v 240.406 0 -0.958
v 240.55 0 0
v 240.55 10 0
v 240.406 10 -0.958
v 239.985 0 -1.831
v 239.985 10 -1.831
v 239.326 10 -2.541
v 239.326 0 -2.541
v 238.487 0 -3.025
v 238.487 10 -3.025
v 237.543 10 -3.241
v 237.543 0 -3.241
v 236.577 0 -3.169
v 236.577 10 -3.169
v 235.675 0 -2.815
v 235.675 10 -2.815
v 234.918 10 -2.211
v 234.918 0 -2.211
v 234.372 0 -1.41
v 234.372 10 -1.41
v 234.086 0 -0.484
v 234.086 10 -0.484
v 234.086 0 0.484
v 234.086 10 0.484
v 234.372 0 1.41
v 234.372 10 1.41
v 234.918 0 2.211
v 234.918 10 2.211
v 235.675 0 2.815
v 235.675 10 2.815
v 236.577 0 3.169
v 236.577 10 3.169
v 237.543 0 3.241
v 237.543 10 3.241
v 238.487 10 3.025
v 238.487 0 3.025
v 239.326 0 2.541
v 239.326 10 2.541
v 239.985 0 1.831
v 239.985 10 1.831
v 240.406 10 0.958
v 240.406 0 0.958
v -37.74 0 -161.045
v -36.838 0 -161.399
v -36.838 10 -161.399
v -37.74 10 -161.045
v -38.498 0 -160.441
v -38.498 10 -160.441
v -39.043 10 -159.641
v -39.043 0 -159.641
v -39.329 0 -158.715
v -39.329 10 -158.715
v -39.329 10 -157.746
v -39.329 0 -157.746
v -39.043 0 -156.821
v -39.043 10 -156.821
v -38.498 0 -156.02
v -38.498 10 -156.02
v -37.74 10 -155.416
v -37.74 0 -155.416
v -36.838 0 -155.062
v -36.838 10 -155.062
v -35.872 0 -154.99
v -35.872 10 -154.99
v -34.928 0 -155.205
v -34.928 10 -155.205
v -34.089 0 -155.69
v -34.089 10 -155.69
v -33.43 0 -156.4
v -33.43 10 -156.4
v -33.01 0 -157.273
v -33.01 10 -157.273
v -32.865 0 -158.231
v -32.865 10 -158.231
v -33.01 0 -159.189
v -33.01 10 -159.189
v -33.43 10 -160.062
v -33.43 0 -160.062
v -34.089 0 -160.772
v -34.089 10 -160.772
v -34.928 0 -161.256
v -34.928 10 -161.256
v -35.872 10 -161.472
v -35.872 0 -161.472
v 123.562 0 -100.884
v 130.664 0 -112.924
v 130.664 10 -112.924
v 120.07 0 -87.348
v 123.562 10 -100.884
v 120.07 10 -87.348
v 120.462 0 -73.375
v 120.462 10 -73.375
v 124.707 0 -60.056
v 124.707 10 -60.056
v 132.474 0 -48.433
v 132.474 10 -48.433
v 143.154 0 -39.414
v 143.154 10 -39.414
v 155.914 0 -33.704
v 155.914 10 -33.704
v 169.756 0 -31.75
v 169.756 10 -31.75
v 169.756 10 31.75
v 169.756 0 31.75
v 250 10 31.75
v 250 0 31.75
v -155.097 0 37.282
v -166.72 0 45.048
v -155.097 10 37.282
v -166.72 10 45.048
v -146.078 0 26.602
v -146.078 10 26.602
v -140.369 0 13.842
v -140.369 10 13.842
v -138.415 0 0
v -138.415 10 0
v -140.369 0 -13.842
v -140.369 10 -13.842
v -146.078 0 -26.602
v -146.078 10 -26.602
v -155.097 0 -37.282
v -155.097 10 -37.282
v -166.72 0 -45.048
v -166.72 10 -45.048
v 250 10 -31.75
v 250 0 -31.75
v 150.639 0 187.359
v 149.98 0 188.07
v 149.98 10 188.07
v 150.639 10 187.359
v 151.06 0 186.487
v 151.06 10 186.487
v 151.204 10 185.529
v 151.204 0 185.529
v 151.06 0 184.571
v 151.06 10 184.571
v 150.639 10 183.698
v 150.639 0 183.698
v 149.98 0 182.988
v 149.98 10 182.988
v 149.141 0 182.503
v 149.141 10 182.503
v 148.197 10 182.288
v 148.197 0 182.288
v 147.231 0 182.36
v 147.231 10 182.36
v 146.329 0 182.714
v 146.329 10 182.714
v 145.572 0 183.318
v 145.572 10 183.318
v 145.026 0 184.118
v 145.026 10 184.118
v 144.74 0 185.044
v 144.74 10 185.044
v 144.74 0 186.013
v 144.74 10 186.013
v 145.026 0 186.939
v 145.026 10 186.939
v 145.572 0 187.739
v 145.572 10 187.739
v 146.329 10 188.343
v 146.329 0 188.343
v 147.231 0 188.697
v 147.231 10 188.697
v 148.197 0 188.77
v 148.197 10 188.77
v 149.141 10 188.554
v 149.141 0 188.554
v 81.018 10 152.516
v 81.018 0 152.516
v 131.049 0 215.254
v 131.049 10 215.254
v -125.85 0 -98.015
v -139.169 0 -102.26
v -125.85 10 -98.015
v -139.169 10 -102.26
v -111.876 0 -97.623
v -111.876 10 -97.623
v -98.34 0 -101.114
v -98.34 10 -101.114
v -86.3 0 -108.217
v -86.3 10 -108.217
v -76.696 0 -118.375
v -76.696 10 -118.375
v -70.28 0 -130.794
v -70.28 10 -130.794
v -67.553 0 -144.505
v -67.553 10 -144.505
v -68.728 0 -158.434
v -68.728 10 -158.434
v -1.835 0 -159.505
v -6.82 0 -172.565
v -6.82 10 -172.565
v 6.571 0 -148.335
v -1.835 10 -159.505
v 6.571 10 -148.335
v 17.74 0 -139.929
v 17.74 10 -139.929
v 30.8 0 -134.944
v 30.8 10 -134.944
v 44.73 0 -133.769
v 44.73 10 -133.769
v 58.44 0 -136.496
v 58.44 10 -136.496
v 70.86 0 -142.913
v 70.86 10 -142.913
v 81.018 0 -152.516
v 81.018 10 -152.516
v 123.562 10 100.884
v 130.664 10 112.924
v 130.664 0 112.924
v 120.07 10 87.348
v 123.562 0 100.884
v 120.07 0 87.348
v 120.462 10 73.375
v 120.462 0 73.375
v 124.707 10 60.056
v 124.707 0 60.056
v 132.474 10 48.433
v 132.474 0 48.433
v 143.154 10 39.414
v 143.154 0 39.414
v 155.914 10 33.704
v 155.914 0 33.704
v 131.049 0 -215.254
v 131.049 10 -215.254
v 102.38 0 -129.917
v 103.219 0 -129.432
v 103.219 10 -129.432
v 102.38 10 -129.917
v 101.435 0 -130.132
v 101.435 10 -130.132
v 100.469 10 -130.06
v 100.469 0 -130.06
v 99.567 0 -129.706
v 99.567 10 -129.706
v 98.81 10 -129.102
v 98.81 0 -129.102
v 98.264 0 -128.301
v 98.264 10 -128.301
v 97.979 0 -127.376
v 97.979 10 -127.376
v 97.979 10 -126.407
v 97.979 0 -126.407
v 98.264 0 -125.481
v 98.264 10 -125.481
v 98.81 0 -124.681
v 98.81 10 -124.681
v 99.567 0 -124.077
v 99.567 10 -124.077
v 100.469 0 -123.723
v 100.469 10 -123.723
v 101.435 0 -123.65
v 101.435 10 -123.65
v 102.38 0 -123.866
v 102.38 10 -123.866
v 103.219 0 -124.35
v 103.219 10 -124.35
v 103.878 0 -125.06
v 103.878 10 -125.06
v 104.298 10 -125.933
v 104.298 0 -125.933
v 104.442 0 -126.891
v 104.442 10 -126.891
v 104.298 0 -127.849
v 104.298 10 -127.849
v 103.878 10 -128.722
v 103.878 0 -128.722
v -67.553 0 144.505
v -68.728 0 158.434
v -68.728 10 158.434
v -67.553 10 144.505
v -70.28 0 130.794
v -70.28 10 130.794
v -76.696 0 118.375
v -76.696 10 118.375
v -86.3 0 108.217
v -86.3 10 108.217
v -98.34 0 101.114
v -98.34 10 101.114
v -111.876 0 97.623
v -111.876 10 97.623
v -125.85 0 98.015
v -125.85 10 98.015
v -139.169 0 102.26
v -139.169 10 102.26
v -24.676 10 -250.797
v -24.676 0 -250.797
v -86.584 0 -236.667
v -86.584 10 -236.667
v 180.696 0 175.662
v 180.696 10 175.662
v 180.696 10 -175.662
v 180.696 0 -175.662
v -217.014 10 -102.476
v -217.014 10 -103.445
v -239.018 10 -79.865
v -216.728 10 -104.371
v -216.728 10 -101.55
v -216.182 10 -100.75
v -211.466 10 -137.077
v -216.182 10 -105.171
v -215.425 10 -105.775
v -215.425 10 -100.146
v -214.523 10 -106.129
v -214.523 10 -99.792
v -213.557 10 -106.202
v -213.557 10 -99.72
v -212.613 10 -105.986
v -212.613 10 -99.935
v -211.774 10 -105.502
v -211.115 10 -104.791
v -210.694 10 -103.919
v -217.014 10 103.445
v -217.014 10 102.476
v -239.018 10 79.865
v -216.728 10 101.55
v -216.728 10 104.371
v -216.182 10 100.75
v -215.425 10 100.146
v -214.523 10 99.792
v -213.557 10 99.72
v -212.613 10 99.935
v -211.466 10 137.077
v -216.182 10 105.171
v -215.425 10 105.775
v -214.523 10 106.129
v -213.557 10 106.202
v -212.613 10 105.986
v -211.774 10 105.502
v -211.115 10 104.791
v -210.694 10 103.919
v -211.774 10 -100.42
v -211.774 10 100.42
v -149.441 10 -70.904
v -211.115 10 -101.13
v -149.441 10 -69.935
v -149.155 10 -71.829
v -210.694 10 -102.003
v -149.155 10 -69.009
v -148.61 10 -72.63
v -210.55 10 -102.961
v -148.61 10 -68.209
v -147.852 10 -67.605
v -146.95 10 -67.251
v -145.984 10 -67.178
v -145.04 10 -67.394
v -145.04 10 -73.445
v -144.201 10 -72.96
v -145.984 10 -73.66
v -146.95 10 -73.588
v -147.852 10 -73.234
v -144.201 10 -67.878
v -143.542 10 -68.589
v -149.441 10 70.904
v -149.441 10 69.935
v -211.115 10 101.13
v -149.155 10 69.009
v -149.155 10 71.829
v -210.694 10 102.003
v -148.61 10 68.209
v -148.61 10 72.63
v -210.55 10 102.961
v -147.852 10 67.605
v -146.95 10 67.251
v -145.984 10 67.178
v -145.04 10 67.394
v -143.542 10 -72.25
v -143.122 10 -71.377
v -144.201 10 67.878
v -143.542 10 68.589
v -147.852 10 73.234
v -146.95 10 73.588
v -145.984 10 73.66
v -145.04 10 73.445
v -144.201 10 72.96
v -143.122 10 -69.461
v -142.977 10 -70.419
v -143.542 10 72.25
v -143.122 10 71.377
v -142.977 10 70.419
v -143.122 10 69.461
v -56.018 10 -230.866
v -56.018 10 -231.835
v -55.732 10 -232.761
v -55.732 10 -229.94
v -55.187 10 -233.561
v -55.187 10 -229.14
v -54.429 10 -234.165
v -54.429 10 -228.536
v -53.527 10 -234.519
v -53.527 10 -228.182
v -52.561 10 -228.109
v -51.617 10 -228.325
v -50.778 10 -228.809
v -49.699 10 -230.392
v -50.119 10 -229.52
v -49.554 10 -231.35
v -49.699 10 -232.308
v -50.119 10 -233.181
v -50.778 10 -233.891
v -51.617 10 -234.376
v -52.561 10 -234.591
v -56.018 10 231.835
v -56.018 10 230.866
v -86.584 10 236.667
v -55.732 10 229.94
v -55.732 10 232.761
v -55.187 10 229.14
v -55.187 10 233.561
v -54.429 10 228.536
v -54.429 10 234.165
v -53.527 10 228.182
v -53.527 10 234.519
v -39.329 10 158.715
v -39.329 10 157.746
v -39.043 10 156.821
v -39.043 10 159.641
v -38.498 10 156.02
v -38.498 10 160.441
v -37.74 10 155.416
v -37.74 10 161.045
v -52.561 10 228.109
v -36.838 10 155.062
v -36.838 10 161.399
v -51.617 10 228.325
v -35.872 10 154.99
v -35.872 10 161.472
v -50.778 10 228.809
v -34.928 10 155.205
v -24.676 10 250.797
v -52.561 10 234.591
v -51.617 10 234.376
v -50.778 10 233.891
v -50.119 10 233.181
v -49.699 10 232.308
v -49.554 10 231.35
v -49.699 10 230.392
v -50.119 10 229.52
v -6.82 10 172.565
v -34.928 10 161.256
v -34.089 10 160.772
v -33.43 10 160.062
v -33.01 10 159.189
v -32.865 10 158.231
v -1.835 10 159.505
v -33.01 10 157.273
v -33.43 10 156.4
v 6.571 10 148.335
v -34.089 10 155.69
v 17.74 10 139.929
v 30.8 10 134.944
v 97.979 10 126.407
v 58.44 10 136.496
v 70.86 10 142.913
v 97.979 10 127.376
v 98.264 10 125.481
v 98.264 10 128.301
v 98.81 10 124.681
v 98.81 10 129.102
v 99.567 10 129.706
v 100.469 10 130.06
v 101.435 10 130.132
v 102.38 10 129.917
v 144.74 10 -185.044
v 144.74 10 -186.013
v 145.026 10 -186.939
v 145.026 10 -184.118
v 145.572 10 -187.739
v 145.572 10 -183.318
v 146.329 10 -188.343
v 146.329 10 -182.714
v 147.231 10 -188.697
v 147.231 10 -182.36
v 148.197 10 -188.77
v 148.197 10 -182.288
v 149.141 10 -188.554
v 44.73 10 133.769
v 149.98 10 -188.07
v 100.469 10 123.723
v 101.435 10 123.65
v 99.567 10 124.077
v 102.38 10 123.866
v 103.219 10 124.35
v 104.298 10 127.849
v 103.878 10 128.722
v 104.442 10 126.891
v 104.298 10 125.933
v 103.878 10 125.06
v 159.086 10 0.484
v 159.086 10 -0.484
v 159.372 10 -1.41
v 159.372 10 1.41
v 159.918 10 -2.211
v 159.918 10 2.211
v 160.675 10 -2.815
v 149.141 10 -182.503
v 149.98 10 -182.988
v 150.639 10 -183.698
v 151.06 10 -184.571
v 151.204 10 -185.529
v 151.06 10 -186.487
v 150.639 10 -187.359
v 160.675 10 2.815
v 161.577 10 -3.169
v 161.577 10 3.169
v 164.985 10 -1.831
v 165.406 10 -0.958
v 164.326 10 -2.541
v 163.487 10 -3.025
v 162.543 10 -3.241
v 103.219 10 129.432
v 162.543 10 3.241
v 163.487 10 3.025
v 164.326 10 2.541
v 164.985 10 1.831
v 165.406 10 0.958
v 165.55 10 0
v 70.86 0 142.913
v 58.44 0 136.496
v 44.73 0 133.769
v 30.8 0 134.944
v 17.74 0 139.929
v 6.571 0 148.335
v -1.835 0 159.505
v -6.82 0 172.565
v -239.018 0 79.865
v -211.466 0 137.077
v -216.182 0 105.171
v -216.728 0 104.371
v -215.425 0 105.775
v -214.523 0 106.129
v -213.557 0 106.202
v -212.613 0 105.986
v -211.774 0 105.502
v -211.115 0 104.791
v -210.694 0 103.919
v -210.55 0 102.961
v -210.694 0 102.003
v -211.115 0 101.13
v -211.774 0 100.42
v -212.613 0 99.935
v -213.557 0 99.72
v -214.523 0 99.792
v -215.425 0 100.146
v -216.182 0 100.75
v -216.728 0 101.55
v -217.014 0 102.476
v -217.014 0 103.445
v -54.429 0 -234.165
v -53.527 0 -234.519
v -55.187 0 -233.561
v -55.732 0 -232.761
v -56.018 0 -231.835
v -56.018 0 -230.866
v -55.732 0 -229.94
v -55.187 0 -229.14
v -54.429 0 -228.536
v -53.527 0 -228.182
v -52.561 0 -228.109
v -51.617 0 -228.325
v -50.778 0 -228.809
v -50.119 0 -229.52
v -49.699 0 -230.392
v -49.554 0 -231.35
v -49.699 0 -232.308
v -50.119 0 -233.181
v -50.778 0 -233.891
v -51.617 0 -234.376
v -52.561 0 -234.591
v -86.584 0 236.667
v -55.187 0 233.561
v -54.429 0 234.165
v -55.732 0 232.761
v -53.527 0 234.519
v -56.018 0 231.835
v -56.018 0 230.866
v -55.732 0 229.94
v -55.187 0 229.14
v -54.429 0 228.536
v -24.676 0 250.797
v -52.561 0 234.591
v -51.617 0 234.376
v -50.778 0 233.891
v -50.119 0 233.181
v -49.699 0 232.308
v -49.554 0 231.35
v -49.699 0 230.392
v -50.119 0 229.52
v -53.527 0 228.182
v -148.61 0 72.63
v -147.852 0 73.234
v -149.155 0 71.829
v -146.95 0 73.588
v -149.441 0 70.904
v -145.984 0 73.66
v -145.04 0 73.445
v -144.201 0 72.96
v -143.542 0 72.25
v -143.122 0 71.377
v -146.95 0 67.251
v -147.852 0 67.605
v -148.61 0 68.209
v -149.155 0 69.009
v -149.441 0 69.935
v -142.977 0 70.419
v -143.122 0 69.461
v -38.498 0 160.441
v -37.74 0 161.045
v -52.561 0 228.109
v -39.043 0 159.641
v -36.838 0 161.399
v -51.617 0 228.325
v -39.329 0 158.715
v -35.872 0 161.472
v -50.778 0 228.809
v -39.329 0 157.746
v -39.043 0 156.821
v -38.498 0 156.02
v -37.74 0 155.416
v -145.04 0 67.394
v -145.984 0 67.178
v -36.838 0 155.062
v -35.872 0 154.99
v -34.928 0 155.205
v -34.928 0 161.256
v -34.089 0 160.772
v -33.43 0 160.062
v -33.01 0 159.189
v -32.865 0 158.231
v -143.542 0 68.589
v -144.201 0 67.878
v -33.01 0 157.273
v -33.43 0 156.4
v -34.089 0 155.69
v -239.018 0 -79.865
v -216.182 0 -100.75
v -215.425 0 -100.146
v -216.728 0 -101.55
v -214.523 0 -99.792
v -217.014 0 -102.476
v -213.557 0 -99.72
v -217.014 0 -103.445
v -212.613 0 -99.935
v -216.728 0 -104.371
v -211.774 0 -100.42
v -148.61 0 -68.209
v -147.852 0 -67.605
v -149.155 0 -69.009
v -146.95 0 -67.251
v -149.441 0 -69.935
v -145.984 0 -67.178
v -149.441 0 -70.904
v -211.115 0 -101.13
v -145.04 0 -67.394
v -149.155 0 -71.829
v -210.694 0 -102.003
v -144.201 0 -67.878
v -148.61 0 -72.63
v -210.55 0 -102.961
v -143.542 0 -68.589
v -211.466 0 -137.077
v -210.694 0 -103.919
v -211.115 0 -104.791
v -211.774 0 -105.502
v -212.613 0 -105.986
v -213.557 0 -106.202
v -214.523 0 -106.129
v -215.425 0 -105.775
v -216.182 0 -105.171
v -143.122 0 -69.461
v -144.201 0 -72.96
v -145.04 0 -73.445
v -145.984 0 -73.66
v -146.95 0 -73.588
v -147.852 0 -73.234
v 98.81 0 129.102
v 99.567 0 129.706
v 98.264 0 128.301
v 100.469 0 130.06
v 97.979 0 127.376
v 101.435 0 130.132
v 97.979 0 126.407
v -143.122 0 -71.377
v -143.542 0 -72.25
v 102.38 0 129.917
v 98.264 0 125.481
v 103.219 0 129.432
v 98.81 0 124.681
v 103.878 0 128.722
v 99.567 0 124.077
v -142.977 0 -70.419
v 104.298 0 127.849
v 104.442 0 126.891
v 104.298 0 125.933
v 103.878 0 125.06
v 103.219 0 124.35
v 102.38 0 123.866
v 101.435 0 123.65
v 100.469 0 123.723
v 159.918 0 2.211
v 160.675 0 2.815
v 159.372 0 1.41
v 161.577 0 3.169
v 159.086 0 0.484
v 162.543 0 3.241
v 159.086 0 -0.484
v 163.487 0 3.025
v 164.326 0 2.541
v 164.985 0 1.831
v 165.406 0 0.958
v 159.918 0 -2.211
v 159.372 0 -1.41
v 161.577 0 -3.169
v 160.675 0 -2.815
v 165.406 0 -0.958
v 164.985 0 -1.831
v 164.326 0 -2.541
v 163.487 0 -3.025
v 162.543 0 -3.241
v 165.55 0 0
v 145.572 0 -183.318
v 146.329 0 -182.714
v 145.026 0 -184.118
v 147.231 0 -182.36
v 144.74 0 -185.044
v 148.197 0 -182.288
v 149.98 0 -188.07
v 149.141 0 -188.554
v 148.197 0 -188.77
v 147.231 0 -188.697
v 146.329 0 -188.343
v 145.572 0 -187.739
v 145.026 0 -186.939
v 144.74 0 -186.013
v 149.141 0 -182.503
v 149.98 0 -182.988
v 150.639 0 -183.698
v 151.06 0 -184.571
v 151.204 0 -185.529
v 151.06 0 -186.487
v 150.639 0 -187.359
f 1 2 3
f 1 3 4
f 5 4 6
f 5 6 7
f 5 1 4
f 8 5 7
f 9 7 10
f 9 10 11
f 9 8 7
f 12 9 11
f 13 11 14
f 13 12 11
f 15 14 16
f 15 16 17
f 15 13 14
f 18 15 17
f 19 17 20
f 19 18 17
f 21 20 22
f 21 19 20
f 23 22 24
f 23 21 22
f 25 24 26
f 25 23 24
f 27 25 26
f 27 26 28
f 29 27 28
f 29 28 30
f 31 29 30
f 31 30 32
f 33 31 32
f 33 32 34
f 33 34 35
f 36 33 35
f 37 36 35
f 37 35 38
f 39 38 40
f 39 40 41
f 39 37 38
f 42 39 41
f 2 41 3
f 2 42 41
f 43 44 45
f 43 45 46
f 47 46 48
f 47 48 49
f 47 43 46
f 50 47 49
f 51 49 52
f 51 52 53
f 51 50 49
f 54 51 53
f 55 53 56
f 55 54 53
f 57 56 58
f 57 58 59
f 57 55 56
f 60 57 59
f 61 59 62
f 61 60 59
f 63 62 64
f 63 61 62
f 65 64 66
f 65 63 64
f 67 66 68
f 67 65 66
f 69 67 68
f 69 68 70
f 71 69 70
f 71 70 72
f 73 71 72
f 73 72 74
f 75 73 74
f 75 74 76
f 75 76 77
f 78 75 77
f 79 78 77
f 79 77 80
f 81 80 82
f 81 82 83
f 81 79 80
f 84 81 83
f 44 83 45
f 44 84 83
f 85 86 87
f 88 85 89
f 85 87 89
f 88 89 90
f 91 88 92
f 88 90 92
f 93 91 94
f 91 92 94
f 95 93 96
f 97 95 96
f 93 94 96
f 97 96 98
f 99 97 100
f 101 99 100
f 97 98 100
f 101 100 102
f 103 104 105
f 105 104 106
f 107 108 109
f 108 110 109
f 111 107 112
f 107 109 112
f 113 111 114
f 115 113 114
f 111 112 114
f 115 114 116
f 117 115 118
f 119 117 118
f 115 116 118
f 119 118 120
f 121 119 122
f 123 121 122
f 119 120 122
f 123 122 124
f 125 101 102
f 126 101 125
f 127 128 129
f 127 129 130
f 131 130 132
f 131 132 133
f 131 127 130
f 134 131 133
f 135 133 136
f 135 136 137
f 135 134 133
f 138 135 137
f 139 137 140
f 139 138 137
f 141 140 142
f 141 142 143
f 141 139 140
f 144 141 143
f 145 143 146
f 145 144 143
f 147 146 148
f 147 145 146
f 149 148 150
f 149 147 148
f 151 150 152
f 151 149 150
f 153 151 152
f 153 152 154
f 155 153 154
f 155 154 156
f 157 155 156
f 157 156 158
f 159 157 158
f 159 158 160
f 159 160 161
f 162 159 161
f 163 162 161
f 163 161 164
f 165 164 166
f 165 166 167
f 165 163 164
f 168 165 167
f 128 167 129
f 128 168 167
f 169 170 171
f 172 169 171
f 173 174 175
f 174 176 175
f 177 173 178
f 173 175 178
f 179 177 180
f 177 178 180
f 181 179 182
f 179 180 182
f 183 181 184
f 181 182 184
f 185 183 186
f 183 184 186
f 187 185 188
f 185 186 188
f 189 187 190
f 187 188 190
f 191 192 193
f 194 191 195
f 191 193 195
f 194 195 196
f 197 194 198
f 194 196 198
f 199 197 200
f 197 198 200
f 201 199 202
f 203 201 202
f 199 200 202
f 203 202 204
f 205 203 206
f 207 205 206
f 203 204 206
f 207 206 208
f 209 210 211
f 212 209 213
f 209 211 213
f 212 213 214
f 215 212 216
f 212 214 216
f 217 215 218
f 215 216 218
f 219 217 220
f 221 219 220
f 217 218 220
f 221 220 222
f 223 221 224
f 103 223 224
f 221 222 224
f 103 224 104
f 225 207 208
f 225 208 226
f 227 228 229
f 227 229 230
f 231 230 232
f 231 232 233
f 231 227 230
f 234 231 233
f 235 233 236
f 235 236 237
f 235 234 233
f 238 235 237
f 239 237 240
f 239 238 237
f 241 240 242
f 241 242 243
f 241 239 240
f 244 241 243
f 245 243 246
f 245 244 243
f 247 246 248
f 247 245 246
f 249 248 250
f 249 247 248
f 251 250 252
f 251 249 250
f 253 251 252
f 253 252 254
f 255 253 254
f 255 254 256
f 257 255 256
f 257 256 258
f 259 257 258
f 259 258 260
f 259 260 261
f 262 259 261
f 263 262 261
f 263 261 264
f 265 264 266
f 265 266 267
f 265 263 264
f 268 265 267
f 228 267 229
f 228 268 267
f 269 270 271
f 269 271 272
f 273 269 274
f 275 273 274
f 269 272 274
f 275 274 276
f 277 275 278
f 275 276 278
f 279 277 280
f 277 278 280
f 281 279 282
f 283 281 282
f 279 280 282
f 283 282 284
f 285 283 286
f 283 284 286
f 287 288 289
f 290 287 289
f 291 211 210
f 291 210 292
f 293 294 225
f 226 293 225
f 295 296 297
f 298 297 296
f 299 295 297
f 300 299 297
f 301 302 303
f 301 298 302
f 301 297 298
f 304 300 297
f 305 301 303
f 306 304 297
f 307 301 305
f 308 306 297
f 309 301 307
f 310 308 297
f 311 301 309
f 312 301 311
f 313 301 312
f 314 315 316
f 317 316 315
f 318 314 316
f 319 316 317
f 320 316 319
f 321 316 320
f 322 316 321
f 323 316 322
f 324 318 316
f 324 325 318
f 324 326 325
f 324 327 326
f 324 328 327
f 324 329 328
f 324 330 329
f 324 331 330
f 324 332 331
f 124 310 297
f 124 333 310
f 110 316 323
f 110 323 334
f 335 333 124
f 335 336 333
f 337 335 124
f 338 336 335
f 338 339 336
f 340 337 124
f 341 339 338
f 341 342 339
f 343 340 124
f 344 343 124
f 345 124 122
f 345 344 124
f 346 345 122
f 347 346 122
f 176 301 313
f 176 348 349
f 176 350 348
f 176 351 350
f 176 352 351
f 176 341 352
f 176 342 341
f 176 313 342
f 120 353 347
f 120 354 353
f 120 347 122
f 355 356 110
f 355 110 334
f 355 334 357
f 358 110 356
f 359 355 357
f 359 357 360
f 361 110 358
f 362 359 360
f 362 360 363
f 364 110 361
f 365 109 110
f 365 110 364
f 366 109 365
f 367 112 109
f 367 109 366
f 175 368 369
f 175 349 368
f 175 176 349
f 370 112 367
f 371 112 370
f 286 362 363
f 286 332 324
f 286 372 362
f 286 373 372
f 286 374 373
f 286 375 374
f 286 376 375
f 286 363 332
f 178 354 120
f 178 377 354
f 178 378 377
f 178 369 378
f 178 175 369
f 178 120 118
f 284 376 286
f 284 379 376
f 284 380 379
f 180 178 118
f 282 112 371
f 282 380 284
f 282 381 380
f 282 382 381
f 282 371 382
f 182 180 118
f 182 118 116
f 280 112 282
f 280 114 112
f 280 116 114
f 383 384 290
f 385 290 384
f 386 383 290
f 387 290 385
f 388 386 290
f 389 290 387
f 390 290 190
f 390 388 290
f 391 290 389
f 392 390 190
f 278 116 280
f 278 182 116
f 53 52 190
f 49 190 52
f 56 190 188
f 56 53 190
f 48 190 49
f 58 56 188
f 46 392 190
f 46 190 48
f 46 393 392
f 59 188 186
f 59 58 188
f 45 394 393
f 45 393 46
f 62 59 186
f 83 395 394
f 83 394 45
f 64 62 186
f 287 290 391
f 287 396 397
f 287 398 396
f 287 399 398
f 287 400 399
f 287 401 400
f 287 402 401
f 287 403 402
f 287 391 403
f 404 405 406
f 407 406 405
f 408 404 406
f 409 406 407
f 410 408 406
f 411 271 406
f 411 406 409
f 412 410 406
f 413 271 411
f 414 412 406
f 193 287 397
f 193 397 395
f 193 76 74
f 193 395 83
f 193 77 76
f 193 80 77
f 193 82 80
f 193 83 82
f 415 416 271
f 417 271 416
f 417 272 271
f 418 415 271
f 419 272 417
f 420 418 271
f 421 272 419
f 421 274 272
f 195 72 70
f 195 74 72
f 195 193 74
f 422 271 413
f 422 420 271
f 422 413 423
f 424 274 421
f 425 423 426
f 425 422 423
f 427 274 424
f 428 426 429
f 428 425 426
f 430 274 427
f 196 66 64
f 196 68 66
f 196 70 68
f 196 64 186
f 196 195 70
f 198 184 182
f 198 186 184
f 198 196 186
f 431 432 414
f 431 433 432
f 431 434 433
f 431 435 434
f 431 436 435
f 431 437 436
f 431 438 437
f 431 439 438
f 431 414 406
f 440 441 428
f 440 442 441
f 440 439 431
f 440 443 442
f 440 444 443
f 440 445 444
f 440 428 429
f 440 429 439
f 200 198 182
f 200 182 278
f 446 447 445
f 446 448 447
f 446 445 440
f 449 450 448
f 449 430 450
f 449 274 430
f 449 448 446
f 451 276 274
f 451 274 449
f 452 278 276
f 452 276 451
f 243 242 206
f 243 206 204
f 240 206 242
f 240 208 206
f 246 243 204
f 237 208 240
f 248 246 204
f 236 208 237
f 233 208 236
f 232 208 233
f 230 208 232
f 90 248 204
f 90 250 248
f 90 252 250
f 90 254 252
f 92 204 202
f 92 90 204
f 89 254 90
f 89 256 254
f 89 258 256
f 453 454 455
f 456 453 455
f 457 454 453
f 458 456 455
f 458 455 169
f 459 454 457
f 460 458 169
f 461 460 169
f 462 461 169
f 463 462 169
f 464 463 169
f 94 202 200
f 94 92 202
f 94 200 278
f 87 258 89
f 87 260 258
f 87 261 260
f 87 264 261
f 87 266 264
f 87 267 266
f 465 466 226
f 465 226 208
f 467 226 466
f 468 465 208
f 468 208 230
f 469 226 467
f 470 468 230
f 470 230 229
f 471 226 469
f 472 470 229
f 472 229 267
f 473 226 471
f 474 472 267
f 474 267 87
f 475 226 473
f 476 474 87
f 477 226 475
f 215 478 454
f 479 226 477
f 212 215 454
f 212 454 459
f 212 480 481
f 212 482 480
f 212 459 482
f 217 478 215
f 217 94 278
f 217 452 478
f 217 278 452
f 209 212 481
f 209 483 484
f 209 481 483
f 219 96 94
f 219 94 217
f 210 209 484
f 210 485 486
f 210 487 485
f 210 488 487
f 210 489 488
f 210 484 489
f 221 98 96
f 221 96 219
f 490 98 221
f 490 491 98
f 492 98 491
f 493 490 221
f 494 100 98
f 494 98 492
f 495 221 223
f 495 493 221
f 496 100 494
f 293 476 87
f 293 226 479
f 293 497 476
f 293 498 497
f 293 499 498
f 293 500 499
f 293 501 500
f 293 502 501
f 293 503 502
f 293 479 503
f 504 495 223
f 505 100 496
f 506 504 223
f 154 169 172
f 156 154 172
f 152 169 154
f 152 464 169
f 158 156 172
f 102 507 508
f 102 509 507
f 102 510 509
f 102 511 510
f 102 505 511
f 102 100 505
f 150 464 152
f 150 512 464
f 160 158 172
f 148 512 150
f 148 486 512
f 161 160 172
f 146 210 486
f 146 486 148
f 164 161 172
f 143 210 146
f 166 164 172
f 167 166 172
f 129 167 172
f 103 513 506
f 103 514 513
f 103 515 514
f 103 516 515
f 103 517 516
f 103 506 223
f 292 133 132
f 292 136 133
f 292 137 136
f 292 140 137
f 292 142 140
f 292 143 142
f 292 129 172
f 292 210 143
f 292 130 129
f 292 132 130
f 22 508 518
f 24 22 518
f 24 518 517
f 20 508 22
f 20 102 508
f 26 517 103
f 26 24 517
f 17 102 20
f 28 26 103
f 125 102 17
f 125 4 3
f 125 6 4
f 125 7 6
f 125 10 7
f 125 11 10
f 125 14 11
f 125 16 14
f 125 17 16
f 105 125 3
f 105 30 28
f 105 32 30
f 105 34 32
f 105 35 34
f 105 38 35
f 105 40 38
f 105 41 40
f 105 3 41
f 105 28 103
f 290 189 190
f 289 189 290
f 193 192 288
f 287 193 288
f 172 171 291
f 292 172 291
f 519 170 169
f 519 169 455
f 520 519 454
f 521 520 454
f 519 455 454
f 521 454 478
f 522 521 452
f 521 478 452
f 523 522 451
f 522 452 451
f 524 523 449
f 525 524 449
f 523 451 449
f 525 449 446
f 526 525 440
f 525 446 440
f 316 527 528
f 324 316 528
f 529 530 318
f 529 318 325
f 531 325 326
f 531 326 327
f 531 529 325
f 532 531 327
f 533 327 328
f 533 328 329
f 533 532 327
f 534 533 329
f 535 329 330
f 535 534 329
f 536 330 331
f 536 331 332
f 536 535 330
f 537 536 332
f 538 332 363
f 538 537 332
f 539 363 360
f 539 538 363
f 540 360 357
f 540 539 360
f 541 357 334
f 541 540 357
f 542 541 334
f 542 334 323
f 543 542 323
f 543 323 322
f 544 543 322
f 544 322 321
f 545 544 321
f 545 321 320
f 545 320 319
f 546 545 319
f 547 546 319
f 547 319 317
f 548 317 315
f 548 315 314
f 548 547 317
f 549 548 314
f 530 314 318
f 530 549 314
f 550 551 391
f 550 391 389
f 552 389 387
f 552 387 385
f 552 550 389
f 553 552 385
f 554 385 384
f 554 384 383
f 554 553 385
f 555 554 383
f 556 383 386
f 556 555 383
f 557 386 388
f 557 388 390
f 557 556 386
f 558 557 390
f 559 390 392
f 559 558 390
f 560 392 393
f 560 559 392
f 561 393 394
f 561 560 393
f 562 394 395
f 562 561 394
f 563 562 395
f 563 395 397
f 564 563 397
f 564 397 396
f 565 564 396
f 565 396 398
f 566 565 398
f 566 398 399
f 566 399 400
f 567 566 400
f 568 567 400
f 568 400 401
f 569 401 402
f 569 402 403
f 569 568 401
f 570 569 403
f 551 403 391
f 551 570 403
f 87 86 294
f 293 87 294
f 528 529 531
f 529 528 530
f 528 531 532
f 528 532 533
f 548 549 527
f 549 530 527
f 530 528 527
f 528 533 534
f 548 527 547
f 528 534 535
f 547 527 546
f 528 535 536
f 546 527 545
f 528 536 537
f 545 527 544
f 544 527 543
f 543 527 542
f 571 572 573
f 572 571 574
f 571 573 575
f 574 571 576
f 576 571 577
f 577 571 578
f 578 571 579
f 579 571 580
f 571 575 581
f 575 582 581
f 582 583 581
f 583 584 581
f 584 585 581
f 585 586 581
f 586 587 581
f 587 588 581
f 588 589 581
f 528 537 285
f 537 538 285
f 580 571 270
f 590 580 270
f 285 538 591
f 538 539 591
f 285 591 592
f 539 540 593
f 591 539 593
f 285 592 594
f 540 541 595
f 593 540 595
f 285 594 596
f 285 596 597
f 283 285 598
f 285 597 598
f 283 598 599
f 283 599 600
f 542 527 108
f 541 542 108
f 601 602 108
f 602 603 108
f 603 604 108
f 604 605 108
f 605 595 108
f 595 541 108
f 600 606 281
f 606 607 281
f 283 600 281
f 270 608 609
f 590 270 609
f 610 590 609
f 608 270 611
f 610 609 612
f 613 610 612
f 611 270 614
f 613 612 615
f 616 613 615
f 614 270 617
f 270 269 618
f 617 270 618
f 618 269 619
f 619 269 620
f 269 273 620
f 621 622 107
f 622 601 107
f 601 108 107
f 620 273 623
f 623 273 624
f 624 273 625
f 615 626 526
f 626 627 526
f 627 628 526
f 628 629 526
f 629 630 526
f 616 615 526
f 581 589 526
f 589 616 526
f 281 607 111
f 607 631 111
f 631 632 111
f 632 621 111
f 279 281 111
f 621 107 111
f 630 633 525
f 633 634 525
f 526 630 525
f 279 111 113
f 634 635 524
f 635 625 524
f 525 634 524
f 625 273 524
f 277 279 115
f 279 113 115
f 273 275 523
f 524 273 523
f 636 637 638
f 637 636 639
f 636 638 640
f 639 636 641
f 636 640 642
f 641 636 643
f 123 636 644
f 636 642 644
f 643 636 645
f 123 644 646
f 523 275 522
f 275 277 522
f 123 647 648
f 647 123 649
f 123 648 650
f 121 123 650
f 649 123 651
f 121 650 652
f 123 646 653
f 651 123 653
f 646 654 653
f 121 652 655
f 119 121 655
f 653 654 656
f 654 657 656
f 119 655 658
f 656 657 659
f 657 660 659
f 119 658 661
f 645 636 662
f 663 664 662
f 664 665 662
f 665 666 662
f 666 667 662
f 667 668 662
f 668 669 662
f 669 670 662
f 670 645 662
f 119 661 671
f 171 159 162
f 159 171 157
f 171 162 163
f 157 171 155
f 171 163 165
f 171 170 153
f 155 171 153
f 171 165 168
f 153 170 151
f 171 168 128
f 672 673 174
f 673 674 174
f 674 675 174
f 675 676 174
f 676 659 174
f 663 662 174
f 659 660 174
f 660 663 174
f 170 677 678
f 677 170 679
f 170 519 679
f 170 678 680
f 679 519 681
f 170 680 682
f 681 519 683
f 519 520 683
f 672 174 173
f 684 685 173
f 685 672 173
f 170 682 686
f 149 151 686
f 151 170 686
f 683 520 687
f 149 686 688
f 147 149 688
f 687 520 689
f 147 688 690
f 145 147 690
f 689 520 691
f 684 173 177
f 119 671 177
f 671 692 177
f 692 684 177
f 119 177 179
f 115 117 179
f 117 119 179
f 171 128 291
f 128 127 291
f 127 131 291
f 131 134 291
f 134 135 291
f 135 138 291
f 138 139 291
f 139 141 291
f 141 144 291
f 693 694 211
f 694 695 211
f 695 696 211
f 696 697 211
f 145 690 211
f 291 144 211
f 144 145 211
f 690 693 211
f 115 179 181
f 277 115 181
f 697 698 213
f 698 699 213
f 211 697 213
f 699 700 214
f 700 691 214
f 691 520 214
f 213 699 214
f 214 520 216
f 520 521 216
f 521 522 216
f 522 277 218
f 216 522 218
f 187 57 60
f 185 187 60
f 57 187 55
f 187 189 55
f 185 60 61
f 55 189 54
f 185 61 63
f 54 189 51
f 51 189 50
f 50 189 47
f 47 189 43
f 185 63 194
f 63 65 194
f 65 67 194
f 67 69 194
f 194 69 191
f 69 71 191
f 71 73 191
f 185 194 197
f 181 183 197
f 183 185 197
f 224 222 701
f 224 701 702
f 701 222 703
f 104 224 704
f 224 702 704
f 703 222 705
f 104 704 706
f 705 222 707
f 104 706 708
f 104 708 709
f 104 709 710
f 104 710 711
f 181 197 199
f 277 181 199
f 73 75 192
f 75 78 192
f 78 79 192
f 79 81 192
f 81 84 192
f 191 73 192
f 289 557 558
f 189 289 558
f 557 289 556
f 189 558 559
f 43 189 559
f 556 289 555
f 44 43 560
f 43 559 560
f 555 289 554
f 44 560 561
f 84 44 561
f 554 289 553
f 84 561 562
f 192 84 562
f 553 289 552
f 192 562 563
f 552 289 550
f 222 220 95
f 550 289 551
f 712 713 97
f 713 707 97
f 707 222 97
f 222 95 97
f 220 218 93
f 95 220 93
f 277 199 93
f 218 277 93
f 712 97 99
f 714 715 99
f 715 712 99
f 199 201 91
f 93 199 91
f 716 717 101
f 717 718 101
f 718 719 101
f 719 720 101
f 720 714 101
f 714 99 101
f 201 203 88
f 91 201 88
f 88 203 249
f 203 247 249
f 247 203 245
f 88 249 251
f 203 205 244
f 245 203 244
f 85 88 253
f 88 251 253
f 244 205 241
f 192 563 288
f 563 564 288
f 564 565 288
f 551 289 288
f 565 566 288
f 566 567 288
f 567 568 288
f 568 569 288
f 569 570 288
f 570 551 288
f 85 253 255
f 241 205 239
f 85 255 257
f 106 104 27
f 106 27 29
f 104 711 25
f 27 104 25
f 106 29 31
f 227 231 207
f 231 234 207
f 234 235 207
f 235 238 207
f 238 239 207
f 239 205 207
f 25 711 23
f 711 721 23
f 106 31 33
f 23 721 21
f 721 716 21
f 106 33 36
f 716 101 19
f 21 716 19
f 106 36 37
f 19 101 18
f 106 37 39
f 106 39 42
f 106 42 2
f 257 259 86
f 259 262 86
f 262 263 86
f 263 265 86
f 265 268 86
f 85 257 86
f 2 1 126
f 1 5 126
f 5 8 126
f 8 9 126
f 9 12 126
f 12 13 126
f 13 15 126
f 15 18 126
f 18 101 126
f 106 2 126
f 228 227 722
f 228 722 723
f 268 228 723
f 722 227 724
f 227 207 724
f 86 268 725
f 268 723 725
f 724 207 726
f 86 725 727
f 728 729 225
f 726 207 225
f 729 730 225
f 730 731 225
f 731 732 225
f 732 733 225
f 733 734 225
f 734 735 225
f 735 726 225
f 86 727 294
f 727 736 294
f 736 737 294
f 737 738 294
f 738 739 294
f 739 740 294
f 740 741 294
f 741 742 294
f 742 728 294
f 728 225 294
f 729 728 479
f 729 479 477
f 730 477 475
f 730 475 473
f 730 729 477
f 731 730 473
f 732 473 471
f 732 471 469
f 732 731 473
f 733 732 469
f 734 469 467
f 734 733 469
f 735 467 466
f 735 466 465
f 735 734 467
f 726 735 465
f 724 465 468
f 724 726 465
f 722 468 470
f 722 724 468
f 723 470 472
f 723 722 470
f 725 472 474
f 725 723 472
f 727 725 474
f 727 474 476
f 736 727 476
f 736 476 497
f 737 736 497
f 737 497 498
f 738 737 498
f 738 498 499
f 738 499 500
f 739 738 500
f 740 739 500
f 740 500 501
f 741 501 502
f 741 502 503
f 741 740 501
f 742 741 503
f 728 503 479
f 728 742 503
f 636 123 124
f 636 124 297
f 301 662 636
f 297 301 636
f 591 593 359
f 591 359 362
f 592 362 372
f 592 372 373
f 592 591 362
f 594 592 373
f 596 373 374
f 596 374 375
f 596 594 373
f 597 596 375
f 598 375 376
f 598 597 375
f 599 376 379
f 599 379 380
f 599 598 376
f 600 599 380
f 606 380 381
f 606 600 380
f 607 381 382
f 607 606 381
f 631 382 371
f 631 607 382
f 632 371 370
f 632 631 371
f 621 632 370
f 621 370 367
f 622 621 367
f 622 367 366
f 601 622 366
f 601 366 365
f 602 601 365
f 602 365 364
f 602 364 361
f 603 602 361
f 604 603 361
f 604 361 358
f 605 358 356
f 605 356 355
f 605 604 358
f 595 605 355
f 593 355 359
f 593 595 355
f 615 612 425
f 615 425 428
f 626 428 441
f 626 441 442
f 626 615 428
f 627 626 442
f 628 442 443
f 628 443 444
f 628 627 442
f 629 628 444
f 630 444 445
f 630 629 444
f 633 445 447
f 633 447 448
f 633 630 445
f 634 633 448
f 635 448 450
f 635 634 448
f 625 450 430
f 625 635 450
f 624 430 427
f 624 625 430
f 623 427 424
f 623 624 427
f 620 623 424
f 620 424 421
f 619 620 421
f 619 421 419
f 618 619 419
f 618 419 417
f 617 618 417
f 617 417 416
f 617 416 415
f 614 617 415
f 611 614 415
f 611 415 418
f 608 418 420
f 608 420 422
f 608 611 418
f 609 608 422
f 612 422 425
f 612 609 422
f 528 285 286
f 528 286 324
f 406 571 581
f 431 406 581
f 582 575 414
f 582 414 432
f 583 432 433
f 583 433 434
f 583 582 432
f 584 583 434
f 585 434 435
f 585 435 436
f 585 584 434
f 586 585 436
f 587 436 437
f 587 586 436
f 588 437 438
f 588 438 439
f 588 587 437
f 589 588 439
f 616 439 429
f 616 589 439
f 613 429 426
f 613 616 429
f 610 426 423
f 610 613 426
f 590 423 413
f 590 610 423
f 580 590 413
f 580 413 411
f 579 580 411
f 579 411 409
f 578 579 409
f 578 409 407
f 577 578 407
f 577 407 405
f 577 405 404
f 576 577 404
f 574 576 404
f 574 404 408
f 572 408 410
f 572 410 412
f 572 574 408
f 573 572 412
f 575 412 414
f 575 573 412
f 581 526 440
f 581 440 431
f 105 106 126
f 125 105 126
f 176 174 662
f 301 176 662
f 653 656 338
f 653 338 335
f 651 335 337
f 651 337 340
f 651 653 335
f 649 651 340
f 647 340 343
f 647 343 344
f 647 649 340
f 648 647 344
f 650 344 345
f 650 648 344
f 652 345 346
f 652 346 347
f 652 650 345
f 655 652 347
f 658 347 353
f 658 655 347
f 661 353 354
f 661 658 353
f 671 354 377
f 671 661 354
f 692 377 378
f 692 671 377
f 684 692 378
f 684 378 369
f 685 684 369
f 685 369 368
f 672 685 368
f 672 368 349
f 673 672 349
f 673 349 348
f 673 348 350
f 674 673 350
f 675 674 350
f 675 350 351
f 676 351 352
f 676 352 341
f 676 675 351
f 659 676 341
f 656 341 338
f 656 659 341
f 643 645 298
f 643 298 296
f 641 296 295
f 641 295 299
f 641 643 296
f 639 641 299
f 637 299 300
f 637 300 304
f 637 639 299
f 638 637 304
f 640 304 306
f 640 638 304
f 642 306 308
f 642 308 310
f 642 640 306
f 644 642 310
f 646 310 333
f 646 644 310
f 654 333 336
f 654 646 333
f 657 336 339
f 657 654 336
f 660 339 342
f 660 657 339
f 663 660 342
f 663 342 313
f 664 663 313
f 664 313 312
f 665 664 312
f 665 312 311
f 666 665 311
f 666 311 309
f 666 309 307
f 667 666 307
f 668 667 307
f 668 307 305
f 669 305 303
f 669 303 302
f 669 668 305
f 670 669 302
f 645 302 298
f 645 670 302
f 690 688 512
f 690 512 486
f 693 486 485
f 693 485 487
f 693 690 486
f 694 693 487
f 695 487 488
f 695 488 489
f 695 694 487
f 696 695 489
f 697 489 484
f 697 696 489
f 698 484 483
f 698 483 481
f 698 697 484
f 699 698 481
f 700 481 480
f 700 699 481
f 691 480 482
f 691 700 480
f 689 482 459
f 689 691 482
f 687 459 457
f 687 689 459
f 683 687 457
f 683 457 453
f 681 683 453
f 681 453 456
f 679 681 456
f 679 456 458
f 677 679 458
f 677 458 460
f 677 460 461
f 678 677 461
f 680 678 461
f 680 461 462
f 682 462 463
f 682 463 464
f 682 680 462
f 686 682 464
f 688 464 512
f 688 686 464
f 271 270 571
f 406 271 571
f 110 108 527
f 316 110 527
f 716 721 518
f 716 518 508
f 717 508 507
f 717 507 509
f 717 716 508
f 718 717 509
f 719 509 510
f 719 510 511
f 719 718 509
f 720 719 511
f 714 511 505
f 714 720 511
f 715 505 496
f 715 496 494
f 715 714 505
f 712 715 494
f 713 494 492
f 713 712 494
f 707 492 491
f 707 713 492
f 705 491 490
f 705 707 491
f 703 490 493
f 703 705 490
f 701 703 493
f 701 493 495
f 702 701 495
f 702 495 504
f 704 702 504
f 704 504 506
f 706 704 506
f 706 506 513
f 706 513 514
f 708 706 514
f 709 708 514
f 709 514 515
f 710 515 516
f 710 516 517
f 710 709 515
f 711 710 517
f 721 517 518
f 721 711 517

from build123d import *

# Parameters (mm, degrees)
SKETCH3_W           = 250
SKETCH3_H           = 63.5
SKETCH3_R           = 3.25
BOSS_EXTRUDE1_DEPTH = 10
CIRPATTERN1_COUNT   = 7
FILLET1_R           = 50


with BuildPart() as part:
    # Sketch3 → Boss-Extrude1 (new body)
    with BuildSketch(Plane(origin=(0, 0, 0), x_dir=(1, 0, 0), z_dir=(0, 1, 0))):
        with Locations((125, 0)):
            Rectangle(SKETCH3_W, SKETCH3_H)
        with Locations((162.3, 0)):
            Circle(SKETCH3_R, mode=Mode.SUBTRACT)
        with Locations((237.3, 0)):
            Circle(SKETCH3_R, mode=Mode.SUBTRACT)
    boss_extrude1 = extrude(amount=BOSS_EXTRUDE1_DEPTH)

    # CirPattern1: Boss-Extrude1 ×7 about axis
    cirpattern1_axis = Axis((0, 0, 0), (0, 1, 0))
    for i in range(1, CIRPATTERN1_COUNT):
        add(boss_extrude1.rotate(cirpattern1_axis, i * 360 / CIRPATTERN1_COUNT))

    # Fillet1
    fillet1_edges = [part.edges().sort_by_distance(p)[0] for p in [
        (65.929554341, 5, 31.75),
        (65.929554341, 5, -31.75),
        (16.283255204, 5, 71.341602418),
        (-45.624667219, 5, 57.211523112),
        (-73.176284653, 5, 0),
        (-45.624667219, 5, -57.211523112),
        (16.283255204, 5, -71.341602418),
    ]]
    fillet(fillet1_edges, radius=FILLET1_R)


solid = part.part
